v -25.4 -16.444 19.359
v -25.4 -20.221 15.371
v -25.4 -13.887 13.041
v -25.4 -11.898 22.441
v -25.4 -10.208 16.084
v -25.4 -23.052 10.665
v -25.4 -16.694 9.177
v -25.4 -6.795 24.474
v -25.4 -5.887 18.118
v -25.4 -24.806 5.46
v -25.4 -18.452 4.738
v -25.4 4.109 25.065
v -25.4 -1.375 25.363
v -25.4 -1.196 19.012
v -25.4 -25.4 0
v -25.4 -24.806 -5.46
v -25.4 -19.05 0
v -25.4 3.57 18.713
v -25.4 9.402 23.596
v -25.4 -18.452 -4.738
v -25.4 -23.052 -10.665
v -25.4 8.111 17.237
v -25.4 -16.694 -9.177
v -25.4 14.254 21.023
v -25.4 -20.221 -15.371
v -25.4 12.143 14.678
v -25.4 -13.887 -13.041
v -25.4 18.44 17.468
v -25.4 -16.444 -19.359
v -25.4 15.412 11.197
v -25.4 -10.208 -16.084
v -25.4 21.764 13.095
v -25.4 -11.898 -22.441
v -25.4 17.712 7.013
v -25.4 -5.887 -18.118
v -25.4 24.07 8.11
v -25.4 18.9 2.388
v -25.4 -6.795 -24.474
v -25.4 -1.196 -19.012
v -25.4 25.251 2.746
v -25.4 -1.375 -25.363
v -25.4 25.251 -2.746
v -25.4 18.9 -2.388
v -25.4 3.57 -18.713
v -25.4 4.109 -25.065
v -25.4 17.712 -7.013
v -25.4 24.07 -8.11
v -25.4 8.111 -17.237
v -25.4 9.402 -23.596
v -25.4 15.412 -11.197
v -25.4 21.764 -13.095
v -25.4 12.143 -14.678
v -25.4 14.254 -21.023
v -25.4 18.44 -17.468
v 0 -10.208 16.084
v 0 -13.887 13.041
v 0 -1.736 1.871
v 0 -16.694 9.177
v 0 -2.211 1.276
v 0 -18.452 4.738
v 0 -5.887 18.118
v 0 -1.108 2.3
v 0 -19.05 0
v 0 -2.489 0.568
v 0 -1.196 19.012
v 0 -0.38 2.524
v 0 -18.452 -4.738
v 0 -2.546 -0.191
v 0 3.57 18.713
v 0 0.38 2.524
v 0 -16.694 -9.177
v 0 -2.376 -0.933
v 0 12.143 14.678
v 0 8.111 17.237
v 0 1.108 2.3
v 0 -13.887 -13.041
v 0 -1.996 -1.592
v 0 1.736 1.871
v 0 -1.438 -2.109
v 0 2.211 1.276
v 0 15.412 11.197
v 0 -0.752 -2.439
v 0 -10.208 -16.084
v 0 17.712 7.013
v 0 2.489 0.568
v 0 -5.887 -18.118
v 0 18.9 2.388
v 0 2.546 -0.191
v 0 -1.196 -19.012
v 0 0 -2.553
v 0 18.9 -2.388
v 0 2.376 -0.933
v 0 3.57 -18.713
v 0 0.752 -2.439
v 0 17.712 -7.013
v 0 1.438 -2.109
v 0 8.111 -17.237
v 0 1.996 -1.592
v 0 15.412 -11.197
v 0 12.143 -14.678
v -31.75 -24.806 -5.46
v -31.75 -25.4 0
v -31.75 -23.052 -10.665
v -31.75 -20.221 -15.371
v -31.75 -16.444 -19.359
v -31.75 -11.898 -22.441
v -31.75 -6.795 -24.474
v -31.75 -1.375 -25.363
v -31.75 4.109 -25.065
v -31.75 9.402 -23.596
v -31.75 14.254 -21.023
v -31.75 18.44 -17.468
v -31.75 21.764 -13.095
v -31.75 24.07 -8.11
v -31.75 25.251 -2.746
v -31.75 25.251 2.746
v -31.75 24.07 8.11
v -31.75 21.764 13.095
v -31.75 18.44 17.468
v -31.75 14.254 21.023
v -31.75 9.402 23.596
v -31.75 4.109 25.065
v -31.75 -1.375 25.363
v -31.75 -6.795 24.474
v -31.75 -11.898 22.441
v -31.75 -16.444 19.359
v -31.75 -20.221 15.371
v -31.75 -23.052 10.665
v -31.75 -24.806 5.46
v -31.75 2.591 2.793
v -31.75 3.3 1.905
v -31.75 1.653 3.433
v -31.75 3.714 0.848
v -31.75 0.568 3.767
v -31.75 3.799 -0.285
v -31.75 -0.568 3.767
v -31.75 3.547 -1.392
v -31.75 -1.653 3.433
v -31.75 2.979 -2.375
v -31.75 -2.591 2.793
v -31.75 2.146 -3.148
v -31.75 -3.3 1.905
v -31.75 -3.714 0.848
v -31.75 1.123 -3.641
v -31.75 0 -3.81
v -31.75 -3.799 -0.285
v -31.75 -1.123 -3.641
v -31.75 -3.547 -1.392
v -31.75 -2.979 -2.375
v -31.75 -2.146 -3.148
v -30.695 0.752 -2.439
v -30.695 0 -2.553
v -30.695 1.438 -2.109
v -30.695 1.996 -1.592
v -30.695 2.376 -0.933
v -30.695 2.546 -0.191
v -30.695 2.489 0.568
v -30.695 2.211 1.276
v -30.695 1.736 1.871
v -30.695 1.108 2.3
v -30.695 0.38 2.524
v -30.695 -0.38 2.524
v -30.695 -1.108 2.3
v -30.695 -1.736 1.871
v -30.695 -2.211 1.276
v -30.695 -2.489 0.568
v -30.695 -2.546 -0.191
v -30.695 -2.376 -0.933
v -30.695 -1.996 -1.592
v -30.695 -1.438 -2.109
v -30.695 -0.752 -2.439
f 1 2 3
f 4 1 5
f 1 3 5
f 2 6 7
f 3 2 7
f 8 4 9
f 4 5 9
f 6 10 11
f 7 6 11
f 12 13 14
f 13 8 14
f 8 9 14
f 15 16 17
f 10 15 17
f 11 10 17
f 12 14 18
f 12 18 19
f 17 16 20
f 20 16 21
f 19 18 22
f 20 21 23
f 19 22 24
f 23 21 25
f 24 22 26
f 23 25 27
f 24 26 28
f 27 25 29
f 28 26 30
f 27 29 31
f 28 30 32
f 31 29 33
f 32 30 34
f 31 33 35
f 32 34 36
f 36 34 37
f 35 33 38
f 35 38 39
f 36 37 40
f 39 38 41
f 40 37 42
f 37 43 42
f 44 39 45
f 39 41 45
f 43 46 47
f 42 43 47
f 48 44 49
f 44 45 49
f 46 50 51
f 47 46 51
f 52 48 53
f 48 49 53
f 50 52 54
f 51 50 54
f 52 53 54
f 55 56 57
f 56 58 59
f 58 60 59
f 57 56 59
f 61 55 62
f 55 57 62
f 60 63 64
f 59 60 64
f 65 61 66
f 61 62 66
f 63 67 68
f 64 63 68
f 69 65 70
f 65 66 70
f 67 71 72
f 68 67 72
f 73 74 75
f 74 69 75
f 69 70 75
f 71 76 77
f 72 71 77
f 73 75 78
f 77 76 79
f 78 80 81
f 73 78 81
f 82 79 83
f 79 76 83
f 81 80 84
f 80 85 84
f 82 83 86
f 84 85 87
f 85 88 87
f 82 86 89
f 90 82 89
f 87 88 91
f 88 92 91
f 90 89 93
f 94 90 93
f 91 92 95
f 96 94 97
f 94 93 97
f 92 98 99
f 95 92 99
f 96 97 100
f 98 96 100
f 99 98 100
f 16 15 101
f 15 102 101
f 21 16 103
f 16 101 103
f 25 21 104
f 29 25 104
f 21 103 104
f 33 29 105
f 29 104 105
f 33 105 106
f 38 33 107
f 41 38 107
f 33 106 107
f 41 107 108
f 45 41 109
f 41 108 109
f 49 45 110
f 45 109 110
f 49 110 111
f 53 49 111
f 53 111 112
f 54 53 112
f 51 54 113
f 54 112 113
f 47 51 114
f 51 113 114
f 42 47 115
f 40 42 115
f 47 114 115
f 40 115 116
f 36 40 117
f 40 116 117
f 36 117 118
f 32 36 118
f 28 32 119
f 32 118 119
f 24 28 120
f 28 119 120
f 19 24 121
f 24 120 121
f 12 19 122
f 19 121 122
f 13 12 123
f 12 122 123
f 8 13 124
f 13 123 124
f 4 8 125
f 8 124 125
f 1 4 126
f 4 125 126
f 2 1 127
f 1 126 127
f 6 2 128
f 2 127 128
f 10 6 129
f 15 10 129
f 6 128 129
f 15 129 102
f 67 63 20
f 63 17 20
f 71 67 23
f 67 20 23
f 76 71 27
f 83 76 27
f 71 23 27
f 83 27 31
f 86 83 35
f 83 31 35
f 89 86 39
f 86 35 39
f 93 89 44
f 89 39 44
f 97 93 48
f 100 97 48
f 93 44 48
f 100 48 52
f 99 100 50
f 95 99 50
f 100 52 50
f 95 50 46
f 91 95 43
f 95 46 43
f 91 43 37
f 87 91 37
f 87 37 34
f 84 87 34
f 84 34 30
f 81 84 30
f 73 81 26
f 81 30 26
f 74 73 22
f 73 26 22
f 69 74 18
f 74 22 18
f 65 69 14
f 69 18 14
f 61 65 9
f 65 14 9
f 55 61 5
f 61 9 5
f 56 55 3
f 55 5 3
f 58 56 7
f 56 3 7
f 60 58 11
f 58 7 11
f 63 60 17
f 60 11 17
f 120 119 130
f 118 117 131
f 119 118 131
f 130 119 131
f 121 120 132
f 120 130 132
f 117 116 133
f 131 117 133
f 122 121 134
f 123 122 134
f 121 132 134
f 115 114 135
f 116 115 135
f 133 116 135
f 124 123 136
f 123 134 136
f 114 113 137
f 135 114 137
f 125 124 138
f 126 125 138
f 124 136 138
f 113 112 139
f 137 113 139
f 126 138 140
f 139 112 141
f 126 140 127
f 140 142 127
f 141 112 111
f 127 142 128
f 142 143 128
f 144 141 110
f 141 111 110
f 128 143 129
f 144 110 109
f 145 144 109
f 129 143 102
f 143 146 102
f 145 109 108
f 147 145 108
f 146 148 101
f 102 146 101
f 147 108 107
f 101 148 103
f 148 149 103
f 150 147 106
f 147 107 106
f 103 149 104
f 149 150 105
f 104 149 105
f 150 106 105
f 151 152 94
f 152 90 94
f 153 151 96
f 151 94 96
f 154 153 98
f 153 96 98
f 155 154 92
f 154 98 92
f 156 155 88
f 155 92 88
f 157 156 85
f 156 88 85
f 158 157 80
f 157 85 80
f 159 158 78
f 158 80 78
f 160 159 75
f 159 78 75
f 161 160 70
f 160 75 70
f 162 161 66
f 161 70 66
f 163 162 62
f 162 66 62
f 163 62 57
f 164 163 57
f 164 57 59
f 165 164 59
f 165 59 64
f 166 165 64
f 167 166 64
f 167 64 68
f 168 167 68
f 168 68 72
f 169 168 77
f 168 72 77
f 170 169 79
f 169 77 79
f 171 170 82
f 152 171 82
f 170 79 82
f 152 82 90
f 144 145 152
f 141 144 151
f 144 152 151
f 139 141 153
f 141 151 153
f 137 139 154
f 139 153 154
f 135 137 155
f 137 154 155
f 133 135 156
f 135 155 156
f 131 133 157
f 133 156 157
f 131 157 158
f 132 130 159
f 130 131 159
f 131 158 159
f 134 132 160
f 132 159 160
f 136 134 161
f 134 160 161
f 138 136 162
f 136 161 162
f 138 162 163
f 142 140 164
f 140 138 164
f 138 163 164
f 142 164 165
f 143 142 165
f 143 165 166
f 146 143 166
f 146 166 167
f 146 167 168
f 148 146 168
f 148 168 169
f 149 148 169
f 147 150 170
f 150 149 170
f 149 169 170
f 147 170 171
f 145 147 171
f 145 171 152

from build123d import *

# Parameters (mm, degrees)
F_1_4_20_TAPPED_HOLE1_D           = 5.1054
F_1_4_20_TAPPED_HOLE1_CSINK_D     = 7.62
F_1_4_20_TAPPED_HOLE1_CSINK_ANGLE = 100


with BuildPart() as part:
    # Sketch1 → Revolve1 (revolve)
    with BuildSketch(Plane.XY):
        Polygon((0, 0), (0, -19.05), (-25.4, -19.05), (-25.4, -25.4), (-31.75, -25.4), (-31.75, 0), align=None)
    revolve(axis=Axis((-45.965152255, 0, 0), (1, 0, 0)))

    # 1/4-20 Tapped Hole1 (through all)
    with Locations(Plane.ZY.offset(31.75)):
        with Locations((0, 0)):
            CounterSinkHole(F_1_4_20_TAPPED_HOLE1_D / 2, F_1_4_20_TAPPED_HOLE1_CSINK_D / 2, counter_sink_angle=F_1_4_20_TAPPED_HOLE1_CSINK_ANGLE)


solid = part.part
